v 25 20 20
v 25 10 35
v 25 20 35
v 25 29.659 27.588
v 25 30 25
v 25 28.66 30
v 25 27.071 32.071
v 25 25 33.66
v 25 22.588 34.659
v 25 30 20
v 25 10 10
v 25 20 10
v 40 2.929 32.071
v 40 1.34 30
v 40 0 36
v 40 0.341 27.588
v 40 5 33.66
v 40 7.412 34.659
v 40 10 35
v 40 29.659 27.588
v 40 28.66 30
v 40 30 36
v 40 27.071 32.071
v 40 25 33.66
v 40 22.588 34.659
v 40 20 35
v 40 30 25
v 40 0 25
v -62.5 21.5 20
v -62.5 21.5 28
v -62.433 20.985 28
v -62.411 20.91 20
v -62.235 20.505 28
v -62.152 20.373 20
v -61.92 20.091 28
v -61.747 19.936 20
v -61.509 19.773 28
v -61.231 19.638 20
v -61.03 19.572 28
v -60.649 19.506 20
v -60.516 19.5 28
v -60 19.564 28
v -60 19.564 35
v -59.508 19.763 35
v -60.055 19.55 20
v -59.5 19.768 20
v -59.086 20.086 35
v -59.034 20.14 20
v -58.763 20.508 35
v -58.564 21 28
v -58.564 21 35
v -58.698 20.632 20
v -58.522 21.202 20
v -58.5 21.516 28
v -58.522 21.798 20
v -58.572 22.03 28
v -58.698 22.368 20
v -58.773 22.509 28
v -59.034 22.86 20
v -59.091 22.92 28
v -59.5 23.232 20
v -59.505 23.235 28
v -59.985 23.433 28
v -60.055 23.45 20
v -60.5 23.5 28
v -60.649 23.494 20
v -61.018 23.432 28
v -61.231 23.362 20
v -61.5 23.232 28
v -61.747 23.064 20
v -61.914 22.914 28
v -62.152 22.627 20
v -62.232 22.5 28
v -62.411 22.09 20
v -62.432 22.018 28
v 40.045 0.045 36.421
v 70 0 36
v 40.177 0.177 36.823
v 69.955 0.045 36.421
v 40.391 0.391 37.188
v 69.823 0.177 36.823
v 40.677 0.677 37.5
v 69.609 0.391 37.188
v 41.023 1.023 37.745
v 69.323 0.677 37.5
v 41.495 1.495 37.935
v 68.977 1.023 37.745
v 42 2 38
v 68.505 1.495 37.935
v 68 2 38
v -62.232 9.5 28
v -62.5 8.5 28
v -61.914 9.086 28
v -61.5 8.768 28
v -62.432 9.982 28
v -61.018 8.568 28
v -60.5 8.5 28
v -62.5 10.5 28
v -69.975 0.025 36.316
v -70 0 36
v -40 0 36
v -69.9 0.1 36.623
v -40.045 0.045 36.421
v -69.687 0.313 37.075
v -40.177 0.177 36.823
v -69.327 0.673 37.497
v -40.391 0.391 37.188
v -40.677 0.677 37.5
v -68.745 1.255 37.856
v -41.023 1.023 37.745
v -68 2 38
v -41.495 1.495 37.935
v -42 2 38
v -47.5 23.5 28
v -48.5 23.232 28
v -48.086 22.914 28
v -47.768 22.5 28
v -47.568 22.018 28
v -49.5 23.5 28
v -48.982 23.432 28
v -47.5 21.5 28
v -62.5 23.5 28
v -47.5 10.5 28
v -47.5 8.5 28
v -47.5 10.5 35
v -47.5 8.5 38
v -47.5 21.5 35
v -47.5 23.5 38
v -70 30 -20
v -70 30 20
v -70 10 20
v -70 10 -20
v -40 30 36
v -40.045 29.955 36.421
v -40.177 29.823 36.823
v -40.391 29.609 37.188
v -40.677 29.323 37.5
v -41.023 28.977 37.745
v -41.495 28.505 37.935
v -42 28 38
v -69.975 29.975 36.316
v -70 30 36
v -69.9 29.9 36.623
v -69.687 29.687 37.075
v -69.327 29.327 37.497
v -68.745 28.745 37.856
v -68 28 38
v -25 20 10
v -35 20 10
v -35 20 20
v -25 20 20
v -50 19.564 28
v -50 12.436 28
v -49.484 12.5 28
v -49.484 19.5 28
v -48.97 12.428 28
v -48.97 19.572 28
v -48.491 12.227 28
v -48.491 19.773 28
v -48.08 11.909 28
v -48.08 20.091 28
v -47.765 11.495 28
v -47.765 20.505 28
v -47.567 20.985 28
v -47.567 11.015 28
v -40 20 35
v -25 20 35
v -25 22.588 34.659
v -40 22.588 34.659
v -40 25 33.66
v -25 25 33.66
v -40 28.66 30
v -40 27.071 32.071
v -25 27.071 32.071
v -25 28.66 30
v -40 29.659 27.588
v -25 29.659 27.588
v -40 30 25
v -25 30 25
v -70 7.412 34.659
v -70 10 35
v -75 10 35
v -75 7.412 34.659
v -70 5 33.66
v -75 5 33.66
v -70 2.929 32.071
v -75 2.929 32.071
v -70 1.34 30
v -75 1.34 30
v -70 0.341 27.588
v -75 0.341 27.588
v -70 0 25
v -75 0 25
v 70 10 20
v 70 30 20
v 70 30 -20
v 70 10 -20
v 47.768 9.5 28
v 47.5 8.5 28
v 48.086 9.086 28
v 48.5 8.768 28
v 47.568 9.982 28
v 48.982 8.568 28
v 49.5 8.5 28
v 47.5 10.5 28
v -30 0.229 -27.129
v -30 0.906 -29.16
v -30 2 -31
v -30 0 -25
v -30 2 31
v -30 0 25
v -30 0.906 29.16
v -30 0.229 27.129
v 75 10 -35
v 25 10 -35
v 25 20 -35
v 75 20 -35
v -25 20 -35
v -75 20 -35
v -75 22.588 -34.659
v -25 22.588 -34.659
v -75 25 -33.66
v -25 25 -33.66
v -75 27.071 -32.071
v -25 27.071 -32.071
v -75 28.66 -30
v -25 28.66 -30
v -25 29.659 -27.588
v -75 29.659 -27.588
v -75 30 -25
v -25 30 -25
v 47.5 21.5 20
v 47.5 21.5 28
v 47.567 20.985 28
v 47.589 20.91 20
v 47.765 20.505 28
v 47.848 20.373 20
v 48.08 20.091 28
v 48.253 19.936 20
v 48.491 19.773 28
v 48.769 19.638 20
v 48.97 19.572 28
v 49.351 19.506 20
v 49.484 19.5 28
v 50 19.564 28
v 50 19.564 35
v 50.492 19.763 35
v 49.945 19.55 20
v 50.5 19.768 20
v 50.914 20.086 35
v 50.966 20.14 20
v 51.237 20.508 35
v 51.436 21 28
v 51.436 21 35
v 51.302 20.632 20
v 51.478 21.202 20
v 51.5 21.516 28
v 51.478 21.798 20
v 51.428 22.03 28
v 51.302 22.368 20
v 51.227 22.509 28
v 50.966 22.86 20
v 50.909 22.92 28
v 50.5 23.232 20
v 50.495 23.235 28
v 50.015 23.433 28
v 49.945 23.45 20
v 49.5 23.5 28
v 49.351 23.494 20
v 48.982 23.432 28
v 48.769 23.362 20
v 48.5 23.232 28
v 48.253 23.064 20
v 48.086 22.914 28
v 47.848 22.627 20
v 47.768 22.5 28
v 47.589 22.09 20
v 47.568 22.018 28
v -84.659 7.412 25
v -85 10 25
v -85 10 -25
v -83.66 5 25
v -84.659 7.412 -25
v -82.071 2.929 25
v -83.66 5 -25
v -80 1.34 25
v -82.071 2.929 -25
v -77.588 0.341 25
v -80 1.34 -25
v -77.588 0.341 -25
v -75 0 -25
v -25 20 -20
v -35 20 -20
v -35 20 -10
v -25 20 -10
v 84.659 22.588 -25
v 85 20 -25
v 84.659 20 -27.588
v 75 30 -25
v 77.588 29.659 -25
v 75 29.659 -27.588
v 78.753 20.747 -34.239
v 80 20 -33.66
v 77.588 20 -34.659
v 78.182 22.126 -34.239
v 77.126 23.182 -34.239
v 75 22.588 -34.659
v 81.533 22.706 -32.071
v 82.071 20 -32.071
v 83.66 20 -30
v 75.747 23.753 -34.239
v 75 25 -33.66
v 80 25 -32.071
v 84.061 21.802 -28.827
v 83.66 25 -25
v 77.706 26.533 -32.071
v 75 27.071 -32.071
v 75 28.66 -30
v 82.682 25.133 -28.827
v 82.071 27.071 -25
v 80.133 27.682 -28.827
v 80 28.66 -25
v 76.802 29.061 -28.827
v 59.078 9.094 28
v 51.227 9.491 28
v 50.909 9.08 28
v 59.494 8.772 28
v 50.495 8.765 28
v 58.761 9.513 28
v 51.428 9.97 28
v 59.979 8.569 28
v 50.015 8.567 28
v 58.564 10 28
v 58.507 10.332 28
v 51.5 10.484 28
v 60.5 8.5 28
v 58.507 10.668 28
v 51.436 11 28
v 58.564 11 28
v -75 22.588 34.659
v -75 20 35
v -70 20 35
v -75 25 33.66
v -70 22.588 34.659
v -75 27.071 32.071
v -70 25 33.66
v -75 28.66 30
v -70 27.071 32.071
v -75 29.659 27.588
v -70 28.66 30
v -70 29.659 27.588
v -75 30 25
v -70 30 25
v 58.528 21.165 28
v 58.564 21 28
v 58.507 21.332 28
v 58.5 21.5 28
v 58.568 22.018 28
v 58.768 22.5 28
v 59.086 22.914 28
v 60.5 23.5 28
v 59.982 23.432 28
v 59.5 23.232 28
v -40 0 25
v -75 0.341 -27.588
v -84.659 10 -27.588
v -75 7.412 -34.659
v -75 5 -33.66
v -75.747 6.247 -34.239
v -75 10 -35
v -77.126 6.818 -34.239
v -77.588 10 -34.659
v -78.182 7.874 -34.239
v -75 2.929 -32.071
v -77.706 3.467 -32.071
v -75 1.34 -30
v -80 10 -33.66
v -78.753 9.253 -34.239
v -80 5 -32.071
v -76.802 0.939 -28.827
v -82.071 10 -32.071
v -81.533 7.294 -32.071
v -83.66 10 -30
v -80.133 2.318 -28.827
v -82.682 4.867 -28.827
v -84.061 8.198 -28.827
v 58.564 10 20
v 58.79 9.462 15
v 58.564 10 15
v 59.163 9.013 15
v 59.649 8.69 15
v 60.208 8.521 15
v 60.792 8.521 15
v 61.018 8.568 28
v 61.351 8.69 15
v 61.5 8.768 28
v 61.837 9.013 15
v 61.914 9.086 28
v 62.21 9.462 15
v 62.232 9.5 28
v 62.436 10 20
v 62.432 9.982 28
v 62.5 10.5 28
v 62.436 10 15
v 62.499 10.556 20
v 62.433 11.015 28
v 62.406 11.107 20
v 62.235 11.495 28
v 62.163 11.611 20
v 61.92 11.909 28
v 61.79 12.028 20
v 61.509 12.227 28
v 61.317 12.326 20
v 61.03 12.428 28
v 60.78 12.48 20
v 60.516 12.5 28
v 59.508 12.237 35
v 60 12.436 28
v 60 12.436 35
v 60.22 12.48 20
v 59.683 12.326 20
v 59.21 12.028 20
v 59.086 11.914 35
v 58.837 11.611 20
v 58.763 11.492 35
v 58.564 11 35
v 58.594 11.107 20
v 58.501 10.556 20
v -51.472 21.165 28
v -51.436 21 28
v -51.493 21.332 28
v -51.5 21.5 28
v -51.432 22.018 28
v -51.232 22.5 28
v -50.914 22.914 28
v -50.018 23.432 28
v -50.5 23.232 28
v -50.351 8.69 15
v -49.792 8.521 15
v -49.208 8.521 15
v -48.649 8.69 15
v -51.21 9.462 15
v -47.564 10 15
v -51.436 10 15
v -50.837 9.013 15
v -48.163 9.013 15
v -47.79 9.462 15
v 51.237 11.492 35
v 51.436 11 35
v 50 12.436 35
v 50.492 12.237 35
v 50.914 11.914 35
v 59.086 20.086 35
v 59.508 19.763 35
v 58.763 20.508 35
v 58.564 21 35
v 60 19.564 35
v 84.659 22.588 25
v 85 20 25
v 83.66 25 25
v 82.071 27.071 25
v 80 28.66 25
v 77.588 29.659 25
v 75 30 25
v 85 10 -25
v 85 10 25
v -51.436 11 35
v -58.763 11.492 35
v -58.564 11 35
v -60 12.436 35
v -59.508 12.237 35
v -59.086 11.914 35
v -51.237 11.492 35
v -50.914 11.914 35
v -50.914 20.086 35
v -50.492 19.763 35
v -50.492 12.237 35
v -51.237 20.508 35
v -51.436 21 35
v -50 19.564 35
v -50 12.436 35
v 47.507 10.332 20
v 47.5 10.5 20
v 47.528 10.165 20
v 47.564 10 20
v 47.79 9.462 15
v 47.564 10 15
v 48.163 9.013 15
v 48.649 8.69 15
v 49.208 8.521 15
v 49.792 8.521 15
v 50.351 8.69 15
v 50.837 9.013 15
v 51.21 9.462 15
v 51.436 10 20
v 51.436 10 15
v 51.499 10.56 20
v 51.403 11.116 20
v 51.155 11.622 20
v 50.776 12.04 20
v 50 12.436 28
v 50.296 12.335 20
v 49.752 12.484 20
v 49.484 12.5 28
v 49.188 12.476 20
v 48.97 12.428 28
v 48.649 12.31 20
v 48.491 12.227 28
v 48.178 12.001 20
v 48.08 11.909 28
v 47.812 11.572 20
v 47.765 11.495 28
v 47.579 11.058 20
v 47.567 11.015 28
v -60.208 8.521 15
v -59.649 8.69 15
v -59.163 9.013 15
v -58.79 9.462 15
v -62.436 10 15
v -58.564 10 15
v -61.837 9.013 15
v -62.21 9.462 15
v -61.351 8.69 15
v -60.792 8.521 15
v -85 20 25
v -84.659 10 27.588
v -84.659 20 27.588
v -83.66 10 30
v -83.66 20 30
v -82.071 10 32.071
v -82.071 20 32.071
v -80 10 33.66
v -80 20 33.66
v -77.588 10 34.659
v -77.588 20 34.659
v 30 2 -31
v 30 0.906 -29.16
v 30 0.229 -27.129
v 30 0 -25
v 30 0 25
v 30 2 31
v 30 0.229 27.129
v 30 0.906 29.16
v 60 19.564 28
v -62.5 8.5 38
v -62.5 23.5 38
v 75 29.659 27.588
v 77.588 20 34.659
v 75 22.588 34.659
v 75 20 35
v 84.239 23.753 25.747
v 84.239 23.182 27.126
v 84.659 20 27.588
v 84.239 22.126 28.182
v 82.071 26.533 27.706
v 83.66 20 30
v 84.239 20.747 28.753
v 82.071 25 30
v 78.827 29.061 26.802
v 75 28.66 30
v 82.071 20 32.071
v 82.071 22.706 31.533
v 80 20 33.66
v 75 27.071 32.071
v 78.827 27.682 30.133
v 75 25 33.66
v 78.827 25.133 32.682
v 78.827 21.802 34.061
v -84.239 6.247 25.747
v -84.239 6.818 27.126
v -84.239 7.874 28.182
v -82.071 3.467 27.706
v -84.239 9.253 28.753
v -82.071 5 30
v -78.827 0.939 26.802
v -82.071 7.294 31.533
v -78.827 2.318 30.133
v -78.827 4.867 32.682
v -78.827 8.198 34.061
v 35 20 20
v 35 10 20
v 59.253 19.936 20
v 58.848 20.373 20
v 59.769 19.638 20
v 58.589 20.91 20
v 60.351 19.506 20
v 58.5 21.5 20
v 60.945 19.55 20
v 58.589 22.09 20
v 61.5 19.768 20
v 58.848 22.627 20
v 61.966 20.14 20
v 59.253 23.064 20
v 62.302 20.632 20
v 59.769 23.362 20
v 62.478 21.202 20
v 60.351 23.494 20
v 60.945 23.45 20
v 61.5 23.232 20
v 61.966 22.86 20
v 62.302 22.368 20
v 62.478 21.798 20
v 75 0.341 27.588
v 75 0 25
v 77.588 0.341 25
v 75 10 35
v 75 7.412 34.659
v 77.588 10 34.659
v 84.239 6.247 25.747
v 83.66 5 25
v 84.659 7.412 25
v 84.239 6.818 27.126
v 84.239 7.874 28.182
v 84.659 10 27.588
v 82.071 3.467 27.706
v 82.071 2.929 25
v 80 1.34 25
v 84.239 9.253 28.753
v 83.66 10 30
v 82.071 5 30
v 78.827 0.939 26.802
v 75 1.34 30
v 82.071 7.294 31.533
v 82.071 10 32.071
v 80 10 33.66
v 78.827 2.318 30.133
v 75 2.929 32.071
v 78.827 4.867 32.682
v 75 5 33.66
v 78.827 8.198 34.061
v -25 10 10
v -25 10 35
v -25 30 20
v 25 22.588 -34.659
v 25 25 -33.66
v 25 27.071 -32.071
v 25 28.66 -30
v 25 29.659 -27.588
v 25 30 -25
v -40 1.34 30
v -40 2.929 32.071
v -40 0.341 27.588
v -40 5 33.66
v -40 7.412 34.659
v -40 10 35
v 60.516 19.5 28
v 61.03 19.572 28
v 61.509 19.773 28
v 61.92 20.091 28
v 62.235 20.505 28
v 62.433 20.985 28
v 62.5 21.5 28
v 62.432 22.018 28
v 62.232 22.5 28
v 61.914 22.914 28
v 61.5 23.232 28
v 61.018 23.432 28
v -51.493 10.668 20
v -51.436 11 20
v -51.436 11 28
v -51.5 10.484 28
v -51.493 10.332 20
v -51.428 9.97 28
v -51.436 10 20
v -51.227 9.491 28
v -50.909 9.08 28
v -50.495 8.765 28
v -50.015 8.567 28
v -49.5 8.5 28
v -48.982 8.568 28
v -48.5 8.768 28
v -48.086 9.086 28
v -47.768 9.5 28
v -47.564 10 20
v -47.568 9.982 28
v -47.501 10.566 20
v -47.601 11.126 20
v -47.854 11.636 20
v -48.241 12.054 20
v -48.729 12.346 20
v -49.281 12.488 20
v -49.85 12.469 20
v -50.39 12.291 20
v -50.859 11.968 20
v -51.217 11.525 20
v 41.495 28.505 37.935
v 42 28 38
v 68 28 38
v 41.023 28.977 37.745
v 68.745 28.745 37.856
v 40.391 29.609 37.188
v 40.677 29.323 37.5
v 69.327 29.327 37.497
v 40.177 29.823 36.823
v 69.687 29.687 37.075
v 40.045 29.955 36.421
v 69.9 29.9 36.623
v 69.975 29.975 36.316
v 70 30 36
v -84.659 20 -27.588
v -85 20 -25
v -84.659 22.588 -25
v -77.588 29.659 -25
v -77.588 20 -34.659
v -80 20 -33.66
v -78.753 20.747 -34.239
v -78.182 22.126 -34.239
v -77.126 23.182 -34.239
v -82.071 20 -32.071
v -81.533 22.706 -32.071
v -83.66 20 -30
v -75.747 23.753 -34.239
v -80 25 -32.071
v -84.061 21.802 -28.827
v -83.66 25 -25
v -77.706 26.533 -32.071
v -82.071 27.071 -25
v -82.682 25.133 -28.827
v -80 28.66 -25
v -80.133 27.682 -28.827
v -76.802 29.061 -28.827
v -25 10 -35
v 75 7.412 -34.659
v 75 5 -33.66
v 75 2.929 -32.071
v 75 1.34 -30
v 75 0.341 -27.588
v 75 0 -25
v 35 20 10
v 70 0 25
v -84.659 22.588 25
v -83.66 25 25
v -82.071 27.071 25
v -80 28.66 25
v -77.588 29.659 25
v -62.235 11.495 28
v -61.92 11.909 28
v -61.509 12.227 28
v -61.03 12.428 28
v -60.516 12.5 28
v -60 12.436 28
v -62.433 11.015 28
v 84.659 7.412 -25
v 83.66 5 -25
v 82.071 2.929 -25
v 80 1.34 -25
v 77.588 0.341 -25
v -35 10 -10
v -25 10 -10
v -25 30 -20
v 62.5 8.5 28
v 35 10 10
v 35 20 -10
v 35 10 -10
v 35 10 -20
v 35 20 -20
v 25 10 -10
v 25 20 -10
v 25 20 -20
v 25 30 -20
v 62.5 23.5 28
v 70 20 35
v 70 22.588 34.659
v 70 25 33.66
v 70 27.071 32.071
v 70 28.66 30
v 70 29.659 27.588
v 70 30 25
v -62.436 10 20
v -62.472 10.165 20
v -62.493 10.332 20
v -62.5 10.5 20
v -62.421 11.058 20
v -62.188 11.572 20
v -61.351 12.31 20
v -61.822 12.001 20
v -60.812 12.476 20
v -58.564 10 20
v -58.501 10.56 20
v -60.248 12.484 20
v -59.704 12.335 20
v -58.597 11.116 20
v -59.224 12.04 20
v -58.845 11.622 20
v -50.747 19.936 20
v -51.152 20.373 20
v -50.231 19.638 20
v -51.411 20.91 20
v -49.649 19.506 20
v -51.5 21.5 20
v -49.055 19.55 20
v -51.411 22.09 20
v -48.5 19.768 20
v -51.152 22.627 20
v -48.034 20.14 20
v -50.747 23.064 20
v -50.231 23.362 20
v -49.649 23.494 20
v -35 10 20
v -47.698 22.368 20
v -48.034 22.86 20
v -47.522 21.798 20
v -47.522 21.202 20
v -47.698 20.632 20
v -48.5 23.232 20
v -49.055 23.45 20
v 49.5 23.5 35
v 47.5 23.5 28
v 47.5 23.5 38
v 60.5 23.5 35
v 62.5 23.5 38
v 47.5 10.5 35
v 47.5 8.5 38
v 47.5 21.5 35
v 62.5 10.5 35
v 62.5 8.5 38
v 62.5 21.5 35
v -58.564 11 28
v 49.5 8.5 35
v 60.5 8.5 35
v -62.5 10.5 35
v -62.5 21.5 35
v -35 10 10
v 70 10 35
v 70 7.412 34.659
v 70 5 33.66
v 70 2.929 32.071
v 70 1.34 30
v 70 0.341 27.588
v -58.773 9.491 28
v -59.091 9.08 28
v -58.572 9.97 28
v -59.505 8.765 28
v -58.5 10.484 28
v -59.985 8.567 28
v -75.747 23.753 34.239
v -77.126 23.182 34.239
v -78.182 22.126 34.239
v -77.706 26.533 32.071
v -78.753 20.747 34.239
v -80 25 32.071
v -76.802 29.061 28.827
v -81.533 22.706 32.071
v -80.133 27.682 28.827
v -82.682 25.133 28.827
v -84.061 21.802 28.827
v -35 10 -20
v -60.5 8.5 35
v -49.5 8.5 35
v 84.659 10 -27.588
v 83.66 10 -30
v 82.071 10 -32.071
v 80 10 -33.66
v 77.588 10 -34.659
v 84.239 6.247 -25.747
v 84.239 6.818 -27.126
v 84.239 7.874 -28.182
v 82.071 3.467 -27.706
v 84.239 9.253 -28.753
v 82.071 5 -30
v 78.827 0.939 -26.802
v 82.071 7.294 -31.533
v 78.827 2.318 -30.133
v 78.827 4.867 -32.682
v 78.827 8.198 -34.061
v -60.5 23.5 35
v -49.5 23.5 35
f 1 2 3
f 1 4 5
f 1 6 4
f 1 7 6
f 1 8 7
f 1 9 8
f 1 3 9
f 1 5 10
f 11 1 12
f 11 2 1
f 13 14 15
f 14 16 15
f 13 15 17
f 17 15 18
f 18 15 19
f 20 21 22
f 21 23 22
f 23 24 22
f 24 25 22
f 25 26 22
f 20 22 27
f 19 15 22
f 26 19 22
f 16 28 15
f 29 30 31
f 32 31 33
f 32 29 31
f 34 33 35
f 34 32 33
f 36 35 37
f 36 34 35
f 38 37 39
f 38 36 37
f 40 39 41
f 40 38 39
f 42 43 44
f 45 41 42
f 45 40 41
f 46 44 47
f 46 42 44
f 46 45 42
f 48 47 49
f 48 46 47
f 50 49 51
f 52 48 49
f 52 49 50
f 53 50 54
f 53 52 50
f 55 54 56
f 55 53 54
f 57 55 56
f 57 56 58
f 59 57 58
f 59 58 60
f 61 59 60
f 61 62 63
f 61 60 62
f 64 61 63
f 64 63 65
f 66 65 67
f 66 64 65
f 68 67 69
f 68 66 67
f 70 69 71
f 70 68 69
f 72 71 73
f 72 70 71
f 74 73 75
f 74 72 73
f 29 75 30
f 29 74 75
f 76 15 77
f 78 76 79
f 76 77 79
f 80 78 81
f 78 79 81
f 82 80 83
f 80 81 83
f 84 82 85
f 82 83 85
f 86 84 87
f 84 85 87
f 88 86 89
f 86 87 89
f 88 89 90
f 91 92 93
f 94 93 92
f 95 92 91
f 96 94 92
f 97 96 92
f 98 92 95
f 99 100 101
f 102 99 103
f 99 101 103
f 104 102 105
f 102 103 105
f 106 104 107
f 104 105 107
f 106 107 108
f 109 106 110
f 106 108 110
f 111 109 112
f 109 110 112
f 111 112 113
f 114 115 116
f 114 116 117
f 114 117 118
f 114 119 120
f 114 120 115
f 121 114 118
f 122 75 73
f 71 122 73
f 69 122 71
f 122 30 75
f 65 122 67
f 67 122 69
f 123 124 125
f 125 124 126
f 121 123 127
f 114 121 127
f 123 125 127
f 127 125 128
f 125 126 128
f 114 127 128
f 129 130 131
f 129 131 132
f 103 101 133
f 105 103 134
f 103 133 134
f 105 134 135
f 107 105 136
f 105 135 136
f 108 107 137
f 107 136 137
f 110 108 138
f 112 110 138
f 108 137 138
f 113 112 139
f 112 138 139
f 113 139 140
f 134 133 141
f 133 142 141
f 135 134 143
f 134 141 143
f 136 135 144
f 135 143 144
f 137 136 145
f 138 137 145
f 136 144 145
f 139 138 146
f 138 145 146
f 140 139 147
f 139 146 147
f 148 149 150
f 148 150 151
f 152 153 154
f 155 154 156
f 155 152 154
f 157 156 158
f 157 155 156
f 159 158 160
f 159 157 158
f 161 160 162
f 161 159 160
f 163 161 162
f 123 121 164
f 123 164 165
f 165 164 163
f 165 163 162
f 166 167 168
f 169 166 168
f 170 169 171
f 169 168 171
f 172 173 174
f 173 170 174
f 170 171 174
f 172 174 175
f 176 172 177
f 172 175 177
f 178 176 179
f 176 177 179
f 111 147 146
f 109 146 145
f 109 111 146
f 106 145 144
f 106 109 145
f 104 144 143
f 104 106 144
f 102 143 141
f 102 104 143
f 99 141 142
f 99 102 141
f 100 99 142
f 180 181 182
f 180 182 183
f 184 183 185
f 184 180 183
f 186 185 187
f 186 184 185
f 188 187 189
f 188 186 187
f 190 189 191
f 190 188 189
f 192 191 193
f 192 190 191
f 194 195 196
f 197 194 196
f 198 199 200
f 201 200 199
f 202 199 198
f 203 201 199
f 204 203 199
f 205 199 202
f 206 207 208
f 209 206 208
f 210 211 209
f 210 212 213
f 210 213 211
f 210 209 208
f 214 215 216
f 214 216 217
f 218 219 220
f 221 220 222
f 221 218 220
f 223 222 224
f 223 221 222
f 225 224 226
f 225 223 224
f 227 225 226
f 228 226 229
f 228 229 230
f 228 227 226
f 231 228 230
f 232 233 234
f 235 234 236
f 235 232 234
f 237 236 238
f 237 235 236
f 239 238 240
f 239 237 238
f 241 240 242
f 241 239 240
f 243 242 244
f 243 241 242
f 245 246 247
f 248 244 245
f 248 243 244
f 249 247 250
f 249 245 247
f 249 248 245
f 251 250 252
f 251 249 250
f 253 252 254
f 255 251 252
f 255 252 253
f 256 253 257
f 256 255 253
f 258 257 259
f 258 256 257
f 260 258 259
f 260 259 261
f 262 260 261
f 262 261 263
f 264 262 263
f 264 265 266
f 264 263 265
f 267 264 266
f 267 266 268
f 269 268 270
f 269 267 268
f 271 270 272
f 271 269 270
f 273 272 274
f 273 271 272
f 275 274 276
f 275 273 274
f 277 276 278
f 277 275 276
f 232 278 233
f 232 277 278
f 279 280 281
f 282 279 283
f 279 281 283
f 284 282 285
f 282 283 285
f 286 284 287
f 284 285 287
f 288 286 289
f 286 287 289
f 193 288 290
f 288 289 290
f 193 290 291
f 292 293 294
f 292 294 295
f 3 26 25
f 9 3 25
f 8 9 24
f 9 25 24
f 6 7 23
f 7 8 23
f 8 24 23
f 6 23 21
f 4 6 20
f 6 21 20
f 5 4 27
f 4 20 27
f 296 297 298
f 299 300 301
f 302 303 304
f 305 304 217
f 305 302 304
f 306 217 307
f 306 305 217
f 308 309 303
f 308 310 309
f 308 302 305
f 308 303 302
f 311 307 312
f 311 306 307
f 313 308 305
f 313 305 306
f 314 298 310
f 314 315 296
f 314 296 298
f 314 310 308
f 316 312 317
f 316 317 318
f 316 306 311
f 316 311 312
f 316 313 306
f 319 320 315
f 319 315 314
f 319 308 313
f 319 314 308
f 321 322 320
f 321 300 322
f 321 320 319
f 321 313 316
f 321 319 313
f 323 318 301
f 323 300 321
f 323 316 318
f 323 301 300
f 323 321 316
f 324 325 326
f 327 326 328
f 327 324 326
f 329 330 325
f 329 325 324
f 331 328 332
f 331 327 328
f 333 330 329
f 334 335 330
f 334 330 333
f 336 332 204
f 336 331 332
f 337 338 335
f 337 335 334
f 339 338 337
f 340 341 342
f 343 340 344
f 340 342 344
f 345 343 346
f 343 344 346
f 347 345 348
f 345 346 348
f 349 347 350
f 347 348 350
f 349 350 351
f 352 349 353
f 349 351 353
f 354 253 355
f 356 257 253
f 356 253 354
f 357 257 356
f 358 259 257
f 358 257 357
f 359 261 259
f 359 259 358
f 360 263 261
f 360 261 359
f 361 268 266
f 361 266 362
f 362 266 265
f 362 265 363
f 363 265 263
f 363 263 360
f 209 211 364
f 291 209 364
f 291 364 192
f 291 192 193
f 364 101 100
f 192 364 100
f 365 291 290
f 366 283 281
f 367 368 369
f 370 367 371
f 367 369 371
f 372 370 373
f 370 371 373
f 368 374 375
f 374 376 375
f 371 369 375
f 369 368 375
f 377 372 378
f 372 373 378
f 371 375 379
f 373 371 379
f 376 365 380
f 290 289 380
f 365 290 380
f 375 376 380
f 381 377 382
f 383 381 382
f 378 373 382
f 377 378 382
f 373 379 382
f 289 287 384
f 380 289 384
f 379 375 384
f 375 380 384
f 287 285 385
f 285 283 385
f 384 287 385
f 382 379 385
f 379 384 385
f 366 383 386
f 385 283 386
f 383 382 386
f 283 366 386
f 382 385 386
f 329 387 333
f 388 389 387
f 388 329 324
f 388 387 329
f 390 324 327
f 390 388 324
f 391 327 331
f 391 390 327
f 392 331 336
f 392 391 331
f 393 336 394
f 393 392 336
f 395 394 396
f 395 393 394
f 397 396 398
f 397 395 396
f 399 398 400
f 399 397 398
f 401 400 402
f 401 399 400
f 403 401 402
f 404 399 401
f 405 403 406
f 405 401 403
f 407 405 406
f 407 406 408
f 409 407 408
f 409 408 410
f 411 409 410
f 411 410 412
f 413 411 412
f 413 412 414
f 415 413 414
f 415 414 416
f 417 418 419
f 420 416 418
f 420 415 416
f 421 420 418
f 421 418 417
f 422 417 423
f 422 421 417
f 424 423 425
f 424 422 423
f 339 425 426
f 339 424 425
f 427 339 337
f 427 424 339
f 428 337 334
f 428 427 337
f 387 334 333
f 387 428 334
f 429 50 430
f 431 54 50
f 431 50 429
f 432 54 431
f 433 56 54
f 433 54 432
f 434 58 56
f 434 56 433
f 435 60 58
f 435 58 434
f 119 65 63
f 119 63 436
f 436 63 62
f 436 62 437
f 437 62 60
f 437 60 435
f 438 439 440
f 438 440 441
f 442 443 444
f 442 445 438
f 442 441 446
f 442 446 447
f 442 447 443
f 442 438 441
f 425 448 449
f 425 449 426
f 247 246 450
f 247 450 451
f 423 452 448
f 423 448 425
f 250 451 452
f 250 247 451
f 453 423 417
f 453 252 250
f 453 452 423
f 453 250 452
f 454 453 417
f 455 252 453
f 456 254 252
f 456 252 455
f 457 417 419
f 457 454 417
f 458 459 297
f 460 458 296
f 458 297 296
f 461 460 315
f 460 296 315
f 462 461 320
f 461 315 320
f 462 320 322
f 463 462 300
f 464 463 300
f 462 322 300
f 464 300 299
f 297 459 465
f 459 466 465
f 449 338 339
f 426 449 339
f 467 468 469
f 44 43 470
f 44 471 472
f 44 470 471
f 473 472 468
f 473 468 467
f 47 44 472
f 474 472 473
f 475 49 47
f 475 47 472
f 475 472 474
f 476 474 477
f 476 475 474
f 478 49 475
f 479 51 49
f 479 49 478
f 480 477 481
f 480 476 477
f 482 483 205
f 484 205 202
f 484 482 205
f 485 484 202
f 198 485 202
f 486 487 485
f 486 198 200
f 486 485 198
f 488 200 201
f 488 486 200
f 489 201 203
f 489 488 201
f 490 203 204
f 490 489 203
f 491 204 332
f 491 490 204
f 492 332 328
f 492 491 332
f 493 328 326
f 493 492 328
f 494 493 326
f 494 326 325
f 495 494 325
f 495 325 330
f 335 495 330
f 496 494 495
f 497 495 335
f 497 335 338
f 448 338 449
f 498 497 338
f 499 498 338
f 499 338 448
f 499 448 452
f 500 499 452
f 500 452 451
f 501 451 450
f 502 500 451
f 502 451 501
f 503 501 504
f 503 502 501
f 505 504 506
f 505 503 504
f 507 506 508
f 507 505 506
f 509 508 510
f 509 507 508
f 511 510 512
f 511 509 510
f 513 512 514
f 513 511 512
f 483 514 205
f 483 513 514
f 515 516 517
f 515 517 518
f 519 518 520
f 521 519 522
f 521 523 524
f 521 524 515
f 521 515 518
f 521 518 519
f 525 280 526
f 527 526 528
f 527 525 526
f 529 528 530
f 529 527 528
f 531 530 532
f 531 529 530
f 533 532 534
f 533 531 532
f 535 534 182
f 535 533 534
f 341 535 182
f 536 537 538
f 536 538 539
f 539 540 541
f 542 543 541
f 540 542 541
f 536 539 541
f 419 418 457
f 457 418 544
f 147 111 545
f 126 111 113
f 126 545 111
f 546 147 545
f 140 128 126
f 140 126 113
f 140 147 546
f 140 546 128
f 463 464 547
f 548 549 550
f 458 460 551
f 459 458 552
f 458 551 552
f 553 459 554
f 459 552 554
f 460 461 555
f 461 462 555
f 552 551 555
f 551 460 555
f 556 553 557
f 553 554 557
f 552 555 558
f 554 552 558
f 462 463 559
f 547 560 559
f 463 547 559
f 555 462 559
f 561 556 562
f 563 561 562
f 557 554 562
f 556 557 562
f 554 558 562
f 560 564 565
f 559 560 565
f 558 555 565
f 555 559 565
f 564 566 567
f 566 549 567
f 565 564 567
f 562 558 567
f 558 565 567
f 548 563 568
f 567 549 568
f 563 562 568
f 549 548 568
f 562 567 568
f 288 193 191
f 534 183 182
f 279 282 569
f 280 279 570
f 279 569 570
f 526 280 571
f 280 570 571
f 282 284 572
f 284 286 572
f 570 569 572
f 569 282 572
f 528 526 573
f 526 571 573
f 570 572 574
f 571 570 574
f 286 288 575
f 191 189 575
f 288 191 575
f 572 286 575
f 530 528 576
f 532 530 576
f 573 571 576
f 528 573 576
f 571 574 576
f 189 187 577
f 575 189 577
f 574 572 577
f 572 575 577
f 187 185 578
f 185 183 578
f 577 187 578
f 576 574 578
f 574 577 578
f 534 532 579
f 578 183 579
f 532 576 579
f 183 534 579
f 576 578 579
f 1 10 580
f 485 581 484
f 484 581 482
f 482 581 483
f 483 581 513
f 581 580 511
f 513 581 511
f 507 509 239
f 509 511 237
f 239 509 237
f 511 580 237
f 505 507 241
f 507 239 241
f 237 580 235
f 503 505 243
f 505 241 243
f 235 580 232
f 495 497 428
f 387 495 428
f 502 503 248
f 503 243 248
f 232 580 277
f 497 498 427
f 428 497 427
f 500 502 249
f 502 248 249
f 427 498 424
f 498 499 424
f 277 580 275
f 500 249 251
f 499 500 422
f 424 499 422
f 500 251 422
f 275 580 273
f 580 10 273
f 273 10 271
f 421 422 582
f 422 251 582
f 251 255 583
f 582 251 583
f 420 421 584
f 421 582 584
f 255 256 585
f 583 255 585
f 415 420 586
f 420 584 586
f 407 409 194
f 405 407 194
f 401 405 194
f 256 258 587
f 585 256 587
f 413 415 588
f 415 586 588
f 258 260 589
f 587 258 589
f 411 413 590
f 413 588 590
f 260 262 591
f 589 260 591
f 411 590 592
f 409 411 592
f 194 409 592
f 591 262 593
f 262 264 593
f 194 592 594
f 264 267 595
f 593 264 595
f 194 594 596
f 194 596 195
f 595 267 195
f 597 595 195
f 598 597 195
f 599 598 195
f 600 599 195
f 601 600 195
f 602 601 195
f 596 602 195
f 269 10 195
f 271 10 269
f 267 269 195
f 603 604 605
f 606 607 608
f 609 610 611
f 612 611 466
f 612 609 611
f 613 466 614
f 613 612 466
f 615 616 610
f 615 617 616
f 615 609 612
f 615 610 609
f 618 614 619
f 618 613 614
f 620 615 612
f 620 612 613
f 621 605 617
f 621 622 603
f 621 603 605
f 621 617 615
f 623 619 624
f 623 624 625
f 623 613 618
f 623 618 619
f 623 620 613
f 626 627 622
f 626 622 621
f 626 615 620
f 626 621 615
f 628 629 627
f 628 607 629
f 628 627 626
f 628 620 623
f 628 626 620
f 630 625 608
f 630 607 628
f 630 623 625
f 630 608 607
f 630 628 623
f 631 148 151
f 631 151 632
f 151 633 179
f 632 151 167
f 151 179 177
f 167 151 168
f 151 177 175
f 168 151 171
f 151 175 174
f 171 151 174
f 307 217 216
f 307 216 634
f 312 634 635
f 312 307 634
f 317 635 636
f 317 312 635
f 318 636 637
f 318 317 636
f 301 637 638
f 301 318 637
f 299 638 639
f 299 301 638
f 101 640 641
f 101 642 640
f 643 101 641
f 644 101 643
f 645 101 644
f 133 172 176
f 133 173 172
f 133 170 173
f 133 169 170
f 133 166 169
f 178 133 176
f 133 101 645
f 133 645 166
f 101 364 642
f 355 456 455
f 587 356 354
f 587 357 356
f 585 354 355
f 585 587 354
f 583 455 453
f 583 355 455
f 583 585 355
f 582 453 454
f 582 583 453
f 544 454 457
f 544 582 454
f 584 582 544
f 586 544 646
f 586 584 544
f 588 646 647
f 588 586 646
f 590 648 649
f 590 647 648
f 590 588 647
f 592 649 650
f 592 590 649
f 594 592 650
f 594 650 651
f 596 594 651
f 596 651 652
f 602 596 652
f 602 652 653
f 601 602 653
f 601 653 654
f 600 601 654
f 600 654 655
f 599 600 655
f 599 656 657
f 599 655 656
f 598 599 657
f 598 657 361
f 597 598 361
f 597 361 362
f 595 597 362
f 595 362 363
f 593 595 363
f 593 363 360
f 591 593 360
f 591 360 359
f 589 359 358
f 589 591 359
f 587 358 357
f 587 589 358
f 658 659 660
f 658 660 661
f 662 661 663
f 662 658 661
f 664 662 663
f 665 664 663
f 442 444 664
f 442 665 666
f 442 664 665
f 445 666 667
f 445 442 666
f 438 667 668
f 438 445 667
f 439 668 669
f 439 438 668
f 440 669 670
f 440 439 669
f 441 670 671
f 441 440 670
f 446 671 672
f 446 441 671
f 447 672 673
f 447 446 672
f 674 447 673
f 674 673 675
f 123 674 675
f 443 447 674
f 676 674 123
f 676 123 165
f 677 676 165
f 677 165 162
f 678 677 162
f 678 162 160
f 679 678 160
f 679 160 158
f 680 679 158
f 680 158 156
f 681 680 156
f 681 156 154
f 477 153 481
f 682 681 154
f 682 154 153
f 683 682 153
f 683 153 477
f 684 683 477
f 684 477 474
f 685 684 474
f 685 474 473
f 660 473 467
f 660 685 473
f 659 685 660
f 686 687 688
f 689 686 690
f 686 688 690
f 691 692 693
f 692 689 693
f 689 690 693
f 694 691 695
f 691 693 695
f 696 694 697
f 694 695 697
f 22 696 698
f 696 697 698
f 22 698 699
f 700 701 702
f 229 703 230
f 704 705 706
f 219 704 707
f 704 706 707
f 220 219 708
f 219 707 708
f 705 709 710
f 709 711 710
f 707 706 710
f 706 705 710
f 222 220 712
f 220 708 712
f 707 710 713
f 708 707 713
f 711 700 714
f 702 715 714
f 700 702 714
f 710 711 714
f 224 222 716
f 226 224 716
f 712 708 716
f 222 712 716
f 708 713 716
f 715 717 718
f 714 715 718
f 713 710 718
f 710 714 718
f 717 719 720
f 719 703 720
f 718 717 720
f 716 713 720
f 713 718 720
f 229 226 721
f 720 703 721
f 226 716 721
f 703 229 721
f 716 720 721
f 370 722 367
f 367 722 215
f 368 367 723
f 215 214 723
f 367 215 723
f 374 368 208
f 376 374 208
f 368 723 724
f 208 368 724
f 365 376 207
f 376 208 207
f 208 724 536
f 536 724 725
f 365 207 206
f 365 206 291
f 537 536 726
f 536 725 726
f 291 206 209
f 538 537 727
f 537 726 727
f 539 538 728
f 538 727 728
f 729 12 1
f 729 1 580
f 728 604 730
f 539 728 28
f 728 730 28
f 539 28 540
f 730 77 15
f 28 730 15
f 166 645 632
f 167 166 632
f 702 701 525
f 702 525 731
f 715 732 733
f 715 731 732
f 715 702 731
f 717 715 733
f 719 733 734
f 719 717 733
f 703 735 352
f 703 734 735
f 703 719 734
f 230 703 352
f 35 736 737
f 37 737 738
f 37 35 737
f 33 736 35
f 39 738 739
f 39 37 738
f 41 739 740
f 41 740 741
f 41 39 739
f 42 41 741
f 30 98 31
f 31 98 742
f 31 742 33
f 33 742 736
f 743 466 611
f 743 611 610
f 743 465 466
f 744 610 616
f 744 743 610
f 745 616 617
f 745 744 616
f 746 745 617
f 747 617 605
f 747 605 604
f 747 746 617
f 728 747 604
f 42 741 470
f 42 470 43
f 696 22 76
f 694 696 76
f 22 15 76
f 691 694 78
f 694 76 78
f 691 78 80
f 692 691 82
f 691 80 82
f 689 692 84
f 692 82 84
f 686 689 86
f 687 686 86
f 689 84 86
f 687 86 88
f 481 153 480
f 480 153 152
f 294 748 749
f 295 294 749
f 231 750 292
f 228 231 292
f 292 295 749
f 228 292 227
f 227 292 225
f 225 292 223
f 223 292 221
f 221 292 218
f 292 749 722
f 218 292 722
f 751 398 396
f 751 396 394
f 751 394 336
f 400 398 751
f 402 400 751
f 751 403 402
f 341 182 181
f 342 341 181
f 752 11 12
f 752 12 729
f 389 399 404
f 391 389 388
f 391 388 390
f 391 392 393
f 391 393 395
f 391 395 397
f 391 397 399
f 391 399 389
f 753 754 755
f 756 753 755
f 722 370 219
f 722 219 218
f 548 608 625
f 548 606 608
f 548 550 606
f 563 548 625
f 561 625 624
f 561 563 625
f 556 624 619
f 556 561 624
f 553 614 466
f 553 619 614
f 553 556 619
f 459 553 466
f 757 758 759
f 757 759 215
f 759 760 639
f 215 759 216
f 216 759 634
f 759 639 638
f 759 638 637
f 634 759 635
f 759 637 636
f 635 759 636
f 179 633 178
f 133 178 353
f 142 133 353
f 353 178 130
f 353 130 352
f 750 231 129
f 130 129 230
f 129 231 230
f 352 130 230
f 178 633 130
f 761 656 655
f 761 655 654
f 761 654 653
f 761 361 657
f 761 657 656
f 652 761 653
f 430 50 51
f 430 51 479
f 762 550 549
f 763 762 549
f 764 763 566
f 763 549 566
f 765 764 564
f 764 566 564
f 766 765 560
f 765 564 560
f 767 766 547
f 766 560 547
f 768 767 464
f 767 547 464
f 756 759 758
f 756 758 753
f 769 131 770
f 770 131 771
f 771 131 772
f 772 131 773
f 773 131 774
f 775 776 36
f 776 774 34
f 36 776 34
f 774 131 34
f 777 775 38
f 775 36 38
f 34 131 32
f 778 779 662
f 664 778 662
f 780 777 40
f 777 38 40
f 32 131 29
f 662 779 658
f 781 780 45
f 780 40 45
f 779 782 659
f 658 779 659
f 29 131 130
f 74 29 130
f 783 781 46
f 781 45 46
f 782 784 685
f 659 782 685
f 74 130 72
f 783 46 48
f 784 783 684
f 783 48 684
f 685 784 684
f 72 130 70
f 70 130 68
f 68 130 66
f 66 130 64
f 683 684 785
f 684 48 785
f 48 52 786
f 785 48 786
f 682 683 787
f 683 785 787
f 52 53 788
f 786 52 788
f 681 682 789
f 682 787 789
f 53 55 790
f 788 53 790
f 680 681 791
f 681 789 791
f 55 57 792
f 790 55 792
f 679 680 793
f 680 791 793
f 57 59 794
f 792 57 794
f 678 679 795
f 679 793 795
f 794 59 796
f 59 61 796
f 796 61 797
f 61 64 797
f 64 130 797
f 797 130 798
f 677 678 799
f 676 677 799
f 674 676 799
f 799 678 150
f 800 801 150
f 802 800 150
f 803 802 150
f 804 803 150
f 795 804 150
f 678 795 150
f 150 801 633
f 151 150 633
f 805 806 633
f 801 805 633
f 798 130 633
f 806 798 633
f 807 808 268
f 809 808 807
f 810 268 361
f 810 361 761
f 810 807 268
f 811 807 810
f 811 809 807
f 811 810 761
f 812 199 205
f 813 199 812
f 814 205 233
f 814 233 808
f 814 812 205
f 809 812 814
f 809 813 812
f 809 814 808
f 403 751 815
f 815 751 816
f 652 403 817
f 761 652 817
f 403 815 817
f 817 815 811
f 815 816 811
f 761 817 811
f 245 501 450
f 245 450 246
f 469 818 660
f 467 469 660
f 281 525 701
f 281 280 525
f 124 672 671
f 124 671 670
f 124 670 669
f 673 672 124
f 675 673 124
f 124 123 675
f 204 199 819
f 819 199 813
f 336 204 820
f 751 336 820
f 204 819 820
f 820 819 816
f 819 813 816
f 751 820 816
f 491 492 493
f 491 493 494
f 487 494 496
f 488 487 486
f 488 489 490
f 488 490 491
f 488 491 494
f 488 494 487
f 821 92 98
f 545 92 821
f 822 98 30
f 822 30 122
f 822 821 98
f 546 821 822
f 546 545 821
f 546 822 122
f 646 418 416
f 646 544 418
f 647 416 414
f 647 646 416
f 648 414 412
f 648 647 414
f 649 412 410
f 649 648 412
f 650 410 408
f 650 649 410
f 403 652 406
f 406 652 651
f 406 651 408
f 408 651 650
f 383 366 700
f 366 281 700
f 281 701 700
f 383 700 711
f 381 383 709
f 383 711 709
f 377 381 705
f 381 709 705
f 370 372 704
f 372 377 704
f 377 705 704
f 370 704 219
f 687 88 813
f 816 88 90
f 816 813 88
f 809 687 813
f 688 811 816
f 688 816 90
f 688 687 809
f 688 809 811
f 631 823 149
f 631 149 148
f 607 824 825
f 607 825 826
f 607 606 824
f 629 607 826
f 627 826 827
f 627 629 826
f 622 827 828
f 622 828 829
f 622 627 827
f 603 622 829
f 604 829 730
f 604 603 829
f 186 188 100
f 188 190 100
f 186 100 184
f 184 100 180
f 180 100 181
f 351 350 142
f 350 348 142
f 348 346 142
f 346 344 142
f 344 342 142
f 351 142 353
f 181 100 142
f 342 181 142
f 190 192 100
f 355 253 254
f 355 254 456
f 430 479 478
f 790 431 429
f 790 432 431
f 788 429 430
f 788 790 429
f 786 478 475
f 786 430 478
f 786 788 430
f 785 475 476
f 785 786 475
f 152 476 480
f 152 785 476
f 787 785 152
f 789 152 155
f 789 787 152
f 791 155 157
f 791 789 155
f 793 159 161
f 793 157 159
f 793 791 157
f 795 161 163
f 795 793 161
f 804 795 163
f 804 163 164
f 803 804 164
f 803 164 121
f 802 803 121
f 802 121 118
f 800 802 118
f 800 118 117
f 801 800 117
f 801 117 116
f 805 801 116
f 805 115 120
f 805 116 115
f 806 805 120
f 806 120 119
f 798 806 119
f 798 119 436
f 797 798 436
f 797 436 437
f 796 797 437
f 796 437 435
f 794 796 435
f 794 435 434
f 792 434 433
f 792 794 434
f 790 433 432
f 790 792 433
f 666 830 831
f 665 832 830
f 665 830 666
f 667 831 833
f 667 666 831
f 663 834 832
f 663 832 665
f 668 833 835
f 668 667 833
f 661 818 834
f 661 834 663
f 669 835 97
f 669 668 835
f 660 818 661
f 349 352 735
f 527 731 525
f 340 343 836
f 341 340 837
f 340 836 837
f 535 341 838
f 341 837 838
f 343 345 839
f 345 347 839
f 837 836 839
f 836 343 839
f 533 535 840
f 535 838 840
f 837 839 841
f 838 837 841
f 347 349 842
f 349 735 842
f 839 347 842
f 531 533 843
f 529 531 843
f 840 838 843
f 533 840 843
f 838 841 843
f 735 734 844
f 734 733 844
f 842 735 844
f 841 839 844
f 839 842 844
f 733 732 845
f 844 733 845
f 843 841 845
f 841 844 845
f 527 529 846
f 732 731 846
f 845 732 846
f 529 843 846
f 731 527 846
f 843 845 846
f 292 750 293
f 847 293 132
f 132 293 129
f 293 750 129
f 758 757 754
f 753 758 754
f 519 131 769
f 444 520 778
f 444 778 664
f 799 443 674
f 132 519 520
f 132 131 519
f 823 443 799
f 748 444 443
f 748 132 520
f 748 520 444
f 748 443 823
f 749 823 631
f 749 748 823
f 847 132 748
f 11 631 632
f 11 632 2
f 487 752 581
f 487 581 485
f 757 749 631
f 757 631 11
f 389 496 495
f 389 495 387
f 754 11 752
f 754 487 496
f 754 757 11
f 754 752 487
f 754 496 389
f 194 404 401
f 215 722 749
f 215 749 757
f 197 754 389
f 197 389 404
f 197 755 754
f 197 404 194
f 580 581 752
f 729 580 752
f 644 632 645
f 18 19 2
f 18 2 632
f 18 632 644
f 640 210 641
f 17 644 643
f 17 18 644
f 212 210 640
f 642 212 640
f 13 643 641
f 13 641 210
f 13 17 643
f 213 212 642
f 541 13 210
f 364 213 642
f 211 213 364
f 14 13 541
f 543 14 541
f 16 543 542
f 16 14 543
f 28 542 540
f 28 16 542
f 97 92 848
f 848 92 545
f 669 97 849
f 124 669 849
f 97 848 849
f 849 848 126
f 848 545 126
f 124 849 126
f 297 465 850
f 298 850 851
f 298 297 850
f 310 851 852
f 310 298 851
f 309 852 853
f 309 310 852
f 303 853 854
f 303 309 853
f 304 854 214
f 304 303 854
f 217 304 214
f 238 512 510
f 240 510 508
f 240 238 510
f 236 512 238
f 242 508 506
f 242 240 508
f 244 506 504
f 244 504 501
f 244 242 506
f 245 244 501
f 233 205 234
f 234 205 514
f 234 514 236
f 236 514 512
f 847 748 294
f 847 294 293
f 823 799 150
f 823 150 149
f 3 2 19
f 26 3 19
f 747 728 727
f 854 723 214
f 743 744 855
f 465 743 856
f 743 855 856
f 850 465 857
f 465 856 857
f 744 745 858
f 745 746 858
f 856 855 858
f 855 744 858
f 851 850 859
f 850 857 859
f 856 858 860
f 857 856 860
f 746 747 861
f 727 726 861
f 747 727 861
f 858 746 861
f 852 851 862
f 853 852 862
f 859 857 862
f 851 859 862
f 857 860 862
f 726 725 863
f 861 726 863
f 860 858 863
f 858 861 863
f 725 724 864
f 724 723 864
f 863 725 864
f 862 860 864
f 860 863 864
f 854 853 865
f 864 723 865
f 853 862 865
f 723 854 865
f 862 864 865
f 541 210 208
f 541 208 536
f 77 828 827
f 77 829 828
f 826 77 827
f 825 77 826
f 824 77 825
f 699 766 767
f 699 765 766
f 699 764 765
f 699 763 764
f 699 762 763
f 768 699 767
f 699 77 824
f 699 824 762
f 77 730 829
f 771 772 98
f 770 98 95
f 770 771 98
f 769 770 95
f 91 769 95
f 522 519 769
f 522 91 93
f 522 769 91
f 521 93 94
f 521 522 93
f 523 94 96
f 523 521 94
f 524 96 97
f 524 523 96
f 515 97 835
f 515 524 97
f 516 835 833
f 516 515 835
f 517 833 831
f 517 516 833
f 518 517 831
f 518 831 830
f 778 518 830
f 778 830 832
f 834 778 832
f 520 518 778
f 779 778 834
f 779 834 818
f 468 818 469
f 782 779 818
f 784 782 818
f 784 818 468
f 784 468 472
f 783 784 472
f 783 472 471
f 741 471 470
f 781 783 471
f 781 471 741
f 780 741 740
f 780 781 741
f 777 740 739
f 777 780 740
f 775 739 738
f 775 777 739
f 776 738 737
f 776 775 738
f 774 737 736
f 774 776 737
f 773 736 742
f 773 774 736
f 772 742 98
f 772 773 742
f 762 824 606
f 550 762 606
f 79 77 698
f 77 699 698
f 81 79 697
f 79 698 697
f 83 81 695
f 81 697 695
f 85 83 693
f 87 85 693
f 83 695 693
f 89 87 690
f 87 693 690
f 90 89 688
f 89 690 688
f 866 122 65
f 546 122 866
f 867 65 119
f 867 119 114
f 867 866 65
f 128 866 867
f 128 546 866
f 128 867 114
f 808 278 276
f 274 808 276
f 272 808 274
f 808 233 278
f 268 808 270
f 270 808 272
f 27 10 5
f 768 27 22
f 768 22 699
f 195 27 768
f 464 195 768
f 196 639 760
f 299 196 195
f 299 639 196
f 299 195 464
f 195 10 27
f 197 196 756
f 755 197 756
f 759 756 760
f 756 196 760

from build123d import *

# Parameters (mm, degrees)
SKETCH1_W               = 170
SKETCH1_H               = 70
BOSS_EXTRUDE1_DEPTH     = 30
FILLET1_R               = 10
SKETCH2_W               = 45
SKETCH2_H               = 40
SKETCH2_W_2             = 50
SKETCH2_H_2             = 10
SKETCH2_H_3             = 5
CUT_EXTRUDE1_DEPTH      = 20
SKETCH3_W               = 10
SKETCH3_H               = 10
BOSS_EXTRUDE2_DEPTH     = 10
SKETCH4_W               = 30
SKETCH4_H               = 10
BOSS_EXTRUDE3_DEPTH     = 3
SKETCH5_W               = 30
SKETCH5_H               = 30
BOSS_EXTRUDE4_DEPTH     = 10
FILLET2_R               = 2
SKETCH6_W               = 15
SKETCH6_H               = 15
CUT_EXTRUDE2_DEPTH      = 10
SKETCH7_W               = 10
SKETCH7_H               = 10
BOSS_EXTRUDE5_DEPTH     = 7
CUT_EXTRUDE3_DEPTH      = 7
CUT_EXTRUDE3_DEPTH_BACK = 13
SKETCH8_R               = 2
SKETCH9_W               = 60
SKETCH9_H               = 70
CUT_EXTRUDE4_DEPTH      = 2


with BuildPart() as part:
    # Sketch1 → Boss-Extrude1 (new body)
    with BuildSketch(Plane(origin=(0, 0, 0), x_dir=(1, 0, 0), z_dir=(0, 1, 0))):
        Rectangle(SKETCH1_W, SKETCH1_H)
    extrude(amount=BOSS_EXTRUDE1_DEPTH)

    # Fillet1
    fillet1_edges = [part.edges().sort_by_distance(p)[0] for p in [
        (-85, 30, 0),
        (0, 30, 35),
        (85, 30, 0),
        (0, 0, 35),
        (-85, 0, 0),
        (0, 0, -35),
        (85, 0, 0),
        (85, 15, 35),
        (-85, 15, 35),
        (-85, 15, -35),
        (85, 15, -35),
        (0, 30, -35),
    ]]
    fillet(fillet1_edges, radius=FILLET1_R)

    # Sketch2 → Cut-Extrude1 (cut)
    with BuildSketch(Plane(origin=(0, 30, 0), x_dir=(1, 0, 0), z_dir=(0, 1, 0))):
        with Locations((-47.5, 0)):
            Rectangle(SKETCH2_W, SKETCH2_H)
        Rectangle(SKETCH2_W_2, SKETCH2_H)
        with Locations((47.5, 0)):
            Rectangle(SKETCH2_W, SKETCH2_H)
        with Locations((0, 30)):
            Rectangle(SKETCH2_W_2, SKETCH2_H_2)
        with Locations((0, 22.5)):
            Rectangle(SKETCH2_W_2, SKETCH2_H_3)
        with Locations((0, -30)):
            Rectangle(SKETCH2_W_2, SKETCH2_H_2)
        with Locations((0, -22.5)):
            Rectangle(SKETCH2_W_2, SKETCH2_H_3)
    extrude(amount=-CUT_EXTRUDE1_DEPTH, mode=Mode.SUBTRACT)

    # Sketch3 → Boss-Extrude2 (add)
    with BuildSketch(Plane(origin=(0, 10, 0), x_dir=(1, 0, 0), z_dir=(0, 1, 0))):
        with Locations((-30, 15)):
            Rectangle(SKETCH3_W, SKETCH3_H)
        with Locations((30, 15)):
            Rectangle(SKETCH3_W, SKETCH3_H)
        with Locations((30, -15)):
            Rectangle(SKETCH3_W, SKETCH3_H)
        with Locations((-30, -15)):
            Rectangle(SKETCH3_W, SKETCH3_H)
    extrude(amount=BOSS_EXTRUDE2_DEPTH)

    # Sketch4 → Boss-Extrude3 (add)
    with BuildSketch(Plane.XY.offset(35)):
        Polygon((-40, 30), (-68.080792204, 30), (-70, 30), (-70, 0), (-40, 0), align=None)
        with Locations((55, 15)):
            Rectangle(SKETCH4_W, SKETCH4_H)
        with Locations((55, 25)):
            Rectangle(SKETCH4_W, SKETCH4_H)
        with Locations((55, 5)):
            Rectangle(SKETCH4_W, SKETCH4_H)
    extrude(amount=BOSS_EXTRUDE3_DEPTH)

    # Sketch5 → Boss-Extrude4 (add)
    with BuildSketch(Plane(origin=(0, 0, 35), x_dir=(-1, 0, 0), z_dir=(0, 0, -1))):
        with Locations((-55, 15)):
            Rectangle(SKETCH5_W, SKETCH5_H)
        with Locations((55, 15)):
            Rectangle(SKETCH5_W, SKETCH5_H)
    extrude(amount=BOSS_EXTRUDE4_DEPTH)

    # Fillet2
    fillet2_edges = [part.edges().sort_by_distance(p)[0] for p in [
        (-70, 15, 38),
        (-55, 0, 38),
        (-40, 15, 38),
        (-55, 30, 38),
        (40, 15, 38),
        (55, 30, 38),
        (55, 0, 38),
        (70, 15, 38),
    ]]
    fillet(fillet2_edges, radius=FILLET2_R)

    # Sketch6 → Cut-Extrude2 (cut)
    with BuildSketch(Plane.XY.offset(38)):
        with Locations((-55, 16)):
            Rectangle(SKETCH6_W, SKETCH6_H)
        with Locations((55, 16)):
            Rectangle(SKETCH6_W, SKETCH6_H)
    extrude(amount=-CUT_EXTRUDE2_DEPTH, mode=Mode.SUBTRACT)

    # Sketch7 → Boss-Extrude5 (add)
    with BuildSketch(Plane.XY.offset(28)):
        with Locations((-55, 16)):
            Rectangle(SKETCH7_W, SKETCH7_H)
        with Locations((55, 16)):
            Rectangle(SKETCH7_W, SKETCH7_H)
    extrude(amount=BOSS_EXTRUDE5_DEPTH)

    # Sketch8 → Cut-Extrude3 (cut, two sides: drawn at the far end of the back side and taken through both)
    with BuildSketch(Plane.XY.offset(28).offset(-CUT_EXTRUDE3_DEPTH_BACK)):
        with Locations(Location((49.5, 21.5, 0), (0, 0, 180))):
            Circle(SKETCH8_R)
        with Locations(Location((49.5, 10.5, 0), (0, 0, 180))):
            Circle(SKETCH8_R)
        with Locations(Location((60.5, 21.5, 0), (0, 0, 180))):
            Circle(SKETCH8_R)
        with Locations(Location((60.5, 10.5, 0), (0, 0, 194.477512186))):
            Circle(SKETCH8_R)
        with Locations(Location((-60.5, 10.5, 0), (0, 0, 180))):
            Circle(SKETCH8_R)
        with Locations(Location((-49.5, 10.5, 0), (0, 0, 165.522487814))):
            Circle(SKETCH8_R)
        with Locations(Location((-60.5, 21.5, 0), (0, 0, 180))):
            Circle(SKETCH8_R)
        with Locations(Location((-49.5, 21.5, 0), (0, 0, 180))):
            Circle(SKETCH8_R)
    extrude(amount=CUT_EXTRUDE3_DEPTH + CUT_EXTRUDE3_DEPTH_BACK, mode=Mode.SUBTRACT)

    # Sketch9 → Cut-Extrude4 (cut)
    with BuildSketch(Plane.XZ):
        Rectangle(SKETCH9_W, SKETCH9_H)
    extrude(amount=-CUT_EXTRUDE4_DEPTH, mode=Mode.SUBTRACT)


solid = part.part
